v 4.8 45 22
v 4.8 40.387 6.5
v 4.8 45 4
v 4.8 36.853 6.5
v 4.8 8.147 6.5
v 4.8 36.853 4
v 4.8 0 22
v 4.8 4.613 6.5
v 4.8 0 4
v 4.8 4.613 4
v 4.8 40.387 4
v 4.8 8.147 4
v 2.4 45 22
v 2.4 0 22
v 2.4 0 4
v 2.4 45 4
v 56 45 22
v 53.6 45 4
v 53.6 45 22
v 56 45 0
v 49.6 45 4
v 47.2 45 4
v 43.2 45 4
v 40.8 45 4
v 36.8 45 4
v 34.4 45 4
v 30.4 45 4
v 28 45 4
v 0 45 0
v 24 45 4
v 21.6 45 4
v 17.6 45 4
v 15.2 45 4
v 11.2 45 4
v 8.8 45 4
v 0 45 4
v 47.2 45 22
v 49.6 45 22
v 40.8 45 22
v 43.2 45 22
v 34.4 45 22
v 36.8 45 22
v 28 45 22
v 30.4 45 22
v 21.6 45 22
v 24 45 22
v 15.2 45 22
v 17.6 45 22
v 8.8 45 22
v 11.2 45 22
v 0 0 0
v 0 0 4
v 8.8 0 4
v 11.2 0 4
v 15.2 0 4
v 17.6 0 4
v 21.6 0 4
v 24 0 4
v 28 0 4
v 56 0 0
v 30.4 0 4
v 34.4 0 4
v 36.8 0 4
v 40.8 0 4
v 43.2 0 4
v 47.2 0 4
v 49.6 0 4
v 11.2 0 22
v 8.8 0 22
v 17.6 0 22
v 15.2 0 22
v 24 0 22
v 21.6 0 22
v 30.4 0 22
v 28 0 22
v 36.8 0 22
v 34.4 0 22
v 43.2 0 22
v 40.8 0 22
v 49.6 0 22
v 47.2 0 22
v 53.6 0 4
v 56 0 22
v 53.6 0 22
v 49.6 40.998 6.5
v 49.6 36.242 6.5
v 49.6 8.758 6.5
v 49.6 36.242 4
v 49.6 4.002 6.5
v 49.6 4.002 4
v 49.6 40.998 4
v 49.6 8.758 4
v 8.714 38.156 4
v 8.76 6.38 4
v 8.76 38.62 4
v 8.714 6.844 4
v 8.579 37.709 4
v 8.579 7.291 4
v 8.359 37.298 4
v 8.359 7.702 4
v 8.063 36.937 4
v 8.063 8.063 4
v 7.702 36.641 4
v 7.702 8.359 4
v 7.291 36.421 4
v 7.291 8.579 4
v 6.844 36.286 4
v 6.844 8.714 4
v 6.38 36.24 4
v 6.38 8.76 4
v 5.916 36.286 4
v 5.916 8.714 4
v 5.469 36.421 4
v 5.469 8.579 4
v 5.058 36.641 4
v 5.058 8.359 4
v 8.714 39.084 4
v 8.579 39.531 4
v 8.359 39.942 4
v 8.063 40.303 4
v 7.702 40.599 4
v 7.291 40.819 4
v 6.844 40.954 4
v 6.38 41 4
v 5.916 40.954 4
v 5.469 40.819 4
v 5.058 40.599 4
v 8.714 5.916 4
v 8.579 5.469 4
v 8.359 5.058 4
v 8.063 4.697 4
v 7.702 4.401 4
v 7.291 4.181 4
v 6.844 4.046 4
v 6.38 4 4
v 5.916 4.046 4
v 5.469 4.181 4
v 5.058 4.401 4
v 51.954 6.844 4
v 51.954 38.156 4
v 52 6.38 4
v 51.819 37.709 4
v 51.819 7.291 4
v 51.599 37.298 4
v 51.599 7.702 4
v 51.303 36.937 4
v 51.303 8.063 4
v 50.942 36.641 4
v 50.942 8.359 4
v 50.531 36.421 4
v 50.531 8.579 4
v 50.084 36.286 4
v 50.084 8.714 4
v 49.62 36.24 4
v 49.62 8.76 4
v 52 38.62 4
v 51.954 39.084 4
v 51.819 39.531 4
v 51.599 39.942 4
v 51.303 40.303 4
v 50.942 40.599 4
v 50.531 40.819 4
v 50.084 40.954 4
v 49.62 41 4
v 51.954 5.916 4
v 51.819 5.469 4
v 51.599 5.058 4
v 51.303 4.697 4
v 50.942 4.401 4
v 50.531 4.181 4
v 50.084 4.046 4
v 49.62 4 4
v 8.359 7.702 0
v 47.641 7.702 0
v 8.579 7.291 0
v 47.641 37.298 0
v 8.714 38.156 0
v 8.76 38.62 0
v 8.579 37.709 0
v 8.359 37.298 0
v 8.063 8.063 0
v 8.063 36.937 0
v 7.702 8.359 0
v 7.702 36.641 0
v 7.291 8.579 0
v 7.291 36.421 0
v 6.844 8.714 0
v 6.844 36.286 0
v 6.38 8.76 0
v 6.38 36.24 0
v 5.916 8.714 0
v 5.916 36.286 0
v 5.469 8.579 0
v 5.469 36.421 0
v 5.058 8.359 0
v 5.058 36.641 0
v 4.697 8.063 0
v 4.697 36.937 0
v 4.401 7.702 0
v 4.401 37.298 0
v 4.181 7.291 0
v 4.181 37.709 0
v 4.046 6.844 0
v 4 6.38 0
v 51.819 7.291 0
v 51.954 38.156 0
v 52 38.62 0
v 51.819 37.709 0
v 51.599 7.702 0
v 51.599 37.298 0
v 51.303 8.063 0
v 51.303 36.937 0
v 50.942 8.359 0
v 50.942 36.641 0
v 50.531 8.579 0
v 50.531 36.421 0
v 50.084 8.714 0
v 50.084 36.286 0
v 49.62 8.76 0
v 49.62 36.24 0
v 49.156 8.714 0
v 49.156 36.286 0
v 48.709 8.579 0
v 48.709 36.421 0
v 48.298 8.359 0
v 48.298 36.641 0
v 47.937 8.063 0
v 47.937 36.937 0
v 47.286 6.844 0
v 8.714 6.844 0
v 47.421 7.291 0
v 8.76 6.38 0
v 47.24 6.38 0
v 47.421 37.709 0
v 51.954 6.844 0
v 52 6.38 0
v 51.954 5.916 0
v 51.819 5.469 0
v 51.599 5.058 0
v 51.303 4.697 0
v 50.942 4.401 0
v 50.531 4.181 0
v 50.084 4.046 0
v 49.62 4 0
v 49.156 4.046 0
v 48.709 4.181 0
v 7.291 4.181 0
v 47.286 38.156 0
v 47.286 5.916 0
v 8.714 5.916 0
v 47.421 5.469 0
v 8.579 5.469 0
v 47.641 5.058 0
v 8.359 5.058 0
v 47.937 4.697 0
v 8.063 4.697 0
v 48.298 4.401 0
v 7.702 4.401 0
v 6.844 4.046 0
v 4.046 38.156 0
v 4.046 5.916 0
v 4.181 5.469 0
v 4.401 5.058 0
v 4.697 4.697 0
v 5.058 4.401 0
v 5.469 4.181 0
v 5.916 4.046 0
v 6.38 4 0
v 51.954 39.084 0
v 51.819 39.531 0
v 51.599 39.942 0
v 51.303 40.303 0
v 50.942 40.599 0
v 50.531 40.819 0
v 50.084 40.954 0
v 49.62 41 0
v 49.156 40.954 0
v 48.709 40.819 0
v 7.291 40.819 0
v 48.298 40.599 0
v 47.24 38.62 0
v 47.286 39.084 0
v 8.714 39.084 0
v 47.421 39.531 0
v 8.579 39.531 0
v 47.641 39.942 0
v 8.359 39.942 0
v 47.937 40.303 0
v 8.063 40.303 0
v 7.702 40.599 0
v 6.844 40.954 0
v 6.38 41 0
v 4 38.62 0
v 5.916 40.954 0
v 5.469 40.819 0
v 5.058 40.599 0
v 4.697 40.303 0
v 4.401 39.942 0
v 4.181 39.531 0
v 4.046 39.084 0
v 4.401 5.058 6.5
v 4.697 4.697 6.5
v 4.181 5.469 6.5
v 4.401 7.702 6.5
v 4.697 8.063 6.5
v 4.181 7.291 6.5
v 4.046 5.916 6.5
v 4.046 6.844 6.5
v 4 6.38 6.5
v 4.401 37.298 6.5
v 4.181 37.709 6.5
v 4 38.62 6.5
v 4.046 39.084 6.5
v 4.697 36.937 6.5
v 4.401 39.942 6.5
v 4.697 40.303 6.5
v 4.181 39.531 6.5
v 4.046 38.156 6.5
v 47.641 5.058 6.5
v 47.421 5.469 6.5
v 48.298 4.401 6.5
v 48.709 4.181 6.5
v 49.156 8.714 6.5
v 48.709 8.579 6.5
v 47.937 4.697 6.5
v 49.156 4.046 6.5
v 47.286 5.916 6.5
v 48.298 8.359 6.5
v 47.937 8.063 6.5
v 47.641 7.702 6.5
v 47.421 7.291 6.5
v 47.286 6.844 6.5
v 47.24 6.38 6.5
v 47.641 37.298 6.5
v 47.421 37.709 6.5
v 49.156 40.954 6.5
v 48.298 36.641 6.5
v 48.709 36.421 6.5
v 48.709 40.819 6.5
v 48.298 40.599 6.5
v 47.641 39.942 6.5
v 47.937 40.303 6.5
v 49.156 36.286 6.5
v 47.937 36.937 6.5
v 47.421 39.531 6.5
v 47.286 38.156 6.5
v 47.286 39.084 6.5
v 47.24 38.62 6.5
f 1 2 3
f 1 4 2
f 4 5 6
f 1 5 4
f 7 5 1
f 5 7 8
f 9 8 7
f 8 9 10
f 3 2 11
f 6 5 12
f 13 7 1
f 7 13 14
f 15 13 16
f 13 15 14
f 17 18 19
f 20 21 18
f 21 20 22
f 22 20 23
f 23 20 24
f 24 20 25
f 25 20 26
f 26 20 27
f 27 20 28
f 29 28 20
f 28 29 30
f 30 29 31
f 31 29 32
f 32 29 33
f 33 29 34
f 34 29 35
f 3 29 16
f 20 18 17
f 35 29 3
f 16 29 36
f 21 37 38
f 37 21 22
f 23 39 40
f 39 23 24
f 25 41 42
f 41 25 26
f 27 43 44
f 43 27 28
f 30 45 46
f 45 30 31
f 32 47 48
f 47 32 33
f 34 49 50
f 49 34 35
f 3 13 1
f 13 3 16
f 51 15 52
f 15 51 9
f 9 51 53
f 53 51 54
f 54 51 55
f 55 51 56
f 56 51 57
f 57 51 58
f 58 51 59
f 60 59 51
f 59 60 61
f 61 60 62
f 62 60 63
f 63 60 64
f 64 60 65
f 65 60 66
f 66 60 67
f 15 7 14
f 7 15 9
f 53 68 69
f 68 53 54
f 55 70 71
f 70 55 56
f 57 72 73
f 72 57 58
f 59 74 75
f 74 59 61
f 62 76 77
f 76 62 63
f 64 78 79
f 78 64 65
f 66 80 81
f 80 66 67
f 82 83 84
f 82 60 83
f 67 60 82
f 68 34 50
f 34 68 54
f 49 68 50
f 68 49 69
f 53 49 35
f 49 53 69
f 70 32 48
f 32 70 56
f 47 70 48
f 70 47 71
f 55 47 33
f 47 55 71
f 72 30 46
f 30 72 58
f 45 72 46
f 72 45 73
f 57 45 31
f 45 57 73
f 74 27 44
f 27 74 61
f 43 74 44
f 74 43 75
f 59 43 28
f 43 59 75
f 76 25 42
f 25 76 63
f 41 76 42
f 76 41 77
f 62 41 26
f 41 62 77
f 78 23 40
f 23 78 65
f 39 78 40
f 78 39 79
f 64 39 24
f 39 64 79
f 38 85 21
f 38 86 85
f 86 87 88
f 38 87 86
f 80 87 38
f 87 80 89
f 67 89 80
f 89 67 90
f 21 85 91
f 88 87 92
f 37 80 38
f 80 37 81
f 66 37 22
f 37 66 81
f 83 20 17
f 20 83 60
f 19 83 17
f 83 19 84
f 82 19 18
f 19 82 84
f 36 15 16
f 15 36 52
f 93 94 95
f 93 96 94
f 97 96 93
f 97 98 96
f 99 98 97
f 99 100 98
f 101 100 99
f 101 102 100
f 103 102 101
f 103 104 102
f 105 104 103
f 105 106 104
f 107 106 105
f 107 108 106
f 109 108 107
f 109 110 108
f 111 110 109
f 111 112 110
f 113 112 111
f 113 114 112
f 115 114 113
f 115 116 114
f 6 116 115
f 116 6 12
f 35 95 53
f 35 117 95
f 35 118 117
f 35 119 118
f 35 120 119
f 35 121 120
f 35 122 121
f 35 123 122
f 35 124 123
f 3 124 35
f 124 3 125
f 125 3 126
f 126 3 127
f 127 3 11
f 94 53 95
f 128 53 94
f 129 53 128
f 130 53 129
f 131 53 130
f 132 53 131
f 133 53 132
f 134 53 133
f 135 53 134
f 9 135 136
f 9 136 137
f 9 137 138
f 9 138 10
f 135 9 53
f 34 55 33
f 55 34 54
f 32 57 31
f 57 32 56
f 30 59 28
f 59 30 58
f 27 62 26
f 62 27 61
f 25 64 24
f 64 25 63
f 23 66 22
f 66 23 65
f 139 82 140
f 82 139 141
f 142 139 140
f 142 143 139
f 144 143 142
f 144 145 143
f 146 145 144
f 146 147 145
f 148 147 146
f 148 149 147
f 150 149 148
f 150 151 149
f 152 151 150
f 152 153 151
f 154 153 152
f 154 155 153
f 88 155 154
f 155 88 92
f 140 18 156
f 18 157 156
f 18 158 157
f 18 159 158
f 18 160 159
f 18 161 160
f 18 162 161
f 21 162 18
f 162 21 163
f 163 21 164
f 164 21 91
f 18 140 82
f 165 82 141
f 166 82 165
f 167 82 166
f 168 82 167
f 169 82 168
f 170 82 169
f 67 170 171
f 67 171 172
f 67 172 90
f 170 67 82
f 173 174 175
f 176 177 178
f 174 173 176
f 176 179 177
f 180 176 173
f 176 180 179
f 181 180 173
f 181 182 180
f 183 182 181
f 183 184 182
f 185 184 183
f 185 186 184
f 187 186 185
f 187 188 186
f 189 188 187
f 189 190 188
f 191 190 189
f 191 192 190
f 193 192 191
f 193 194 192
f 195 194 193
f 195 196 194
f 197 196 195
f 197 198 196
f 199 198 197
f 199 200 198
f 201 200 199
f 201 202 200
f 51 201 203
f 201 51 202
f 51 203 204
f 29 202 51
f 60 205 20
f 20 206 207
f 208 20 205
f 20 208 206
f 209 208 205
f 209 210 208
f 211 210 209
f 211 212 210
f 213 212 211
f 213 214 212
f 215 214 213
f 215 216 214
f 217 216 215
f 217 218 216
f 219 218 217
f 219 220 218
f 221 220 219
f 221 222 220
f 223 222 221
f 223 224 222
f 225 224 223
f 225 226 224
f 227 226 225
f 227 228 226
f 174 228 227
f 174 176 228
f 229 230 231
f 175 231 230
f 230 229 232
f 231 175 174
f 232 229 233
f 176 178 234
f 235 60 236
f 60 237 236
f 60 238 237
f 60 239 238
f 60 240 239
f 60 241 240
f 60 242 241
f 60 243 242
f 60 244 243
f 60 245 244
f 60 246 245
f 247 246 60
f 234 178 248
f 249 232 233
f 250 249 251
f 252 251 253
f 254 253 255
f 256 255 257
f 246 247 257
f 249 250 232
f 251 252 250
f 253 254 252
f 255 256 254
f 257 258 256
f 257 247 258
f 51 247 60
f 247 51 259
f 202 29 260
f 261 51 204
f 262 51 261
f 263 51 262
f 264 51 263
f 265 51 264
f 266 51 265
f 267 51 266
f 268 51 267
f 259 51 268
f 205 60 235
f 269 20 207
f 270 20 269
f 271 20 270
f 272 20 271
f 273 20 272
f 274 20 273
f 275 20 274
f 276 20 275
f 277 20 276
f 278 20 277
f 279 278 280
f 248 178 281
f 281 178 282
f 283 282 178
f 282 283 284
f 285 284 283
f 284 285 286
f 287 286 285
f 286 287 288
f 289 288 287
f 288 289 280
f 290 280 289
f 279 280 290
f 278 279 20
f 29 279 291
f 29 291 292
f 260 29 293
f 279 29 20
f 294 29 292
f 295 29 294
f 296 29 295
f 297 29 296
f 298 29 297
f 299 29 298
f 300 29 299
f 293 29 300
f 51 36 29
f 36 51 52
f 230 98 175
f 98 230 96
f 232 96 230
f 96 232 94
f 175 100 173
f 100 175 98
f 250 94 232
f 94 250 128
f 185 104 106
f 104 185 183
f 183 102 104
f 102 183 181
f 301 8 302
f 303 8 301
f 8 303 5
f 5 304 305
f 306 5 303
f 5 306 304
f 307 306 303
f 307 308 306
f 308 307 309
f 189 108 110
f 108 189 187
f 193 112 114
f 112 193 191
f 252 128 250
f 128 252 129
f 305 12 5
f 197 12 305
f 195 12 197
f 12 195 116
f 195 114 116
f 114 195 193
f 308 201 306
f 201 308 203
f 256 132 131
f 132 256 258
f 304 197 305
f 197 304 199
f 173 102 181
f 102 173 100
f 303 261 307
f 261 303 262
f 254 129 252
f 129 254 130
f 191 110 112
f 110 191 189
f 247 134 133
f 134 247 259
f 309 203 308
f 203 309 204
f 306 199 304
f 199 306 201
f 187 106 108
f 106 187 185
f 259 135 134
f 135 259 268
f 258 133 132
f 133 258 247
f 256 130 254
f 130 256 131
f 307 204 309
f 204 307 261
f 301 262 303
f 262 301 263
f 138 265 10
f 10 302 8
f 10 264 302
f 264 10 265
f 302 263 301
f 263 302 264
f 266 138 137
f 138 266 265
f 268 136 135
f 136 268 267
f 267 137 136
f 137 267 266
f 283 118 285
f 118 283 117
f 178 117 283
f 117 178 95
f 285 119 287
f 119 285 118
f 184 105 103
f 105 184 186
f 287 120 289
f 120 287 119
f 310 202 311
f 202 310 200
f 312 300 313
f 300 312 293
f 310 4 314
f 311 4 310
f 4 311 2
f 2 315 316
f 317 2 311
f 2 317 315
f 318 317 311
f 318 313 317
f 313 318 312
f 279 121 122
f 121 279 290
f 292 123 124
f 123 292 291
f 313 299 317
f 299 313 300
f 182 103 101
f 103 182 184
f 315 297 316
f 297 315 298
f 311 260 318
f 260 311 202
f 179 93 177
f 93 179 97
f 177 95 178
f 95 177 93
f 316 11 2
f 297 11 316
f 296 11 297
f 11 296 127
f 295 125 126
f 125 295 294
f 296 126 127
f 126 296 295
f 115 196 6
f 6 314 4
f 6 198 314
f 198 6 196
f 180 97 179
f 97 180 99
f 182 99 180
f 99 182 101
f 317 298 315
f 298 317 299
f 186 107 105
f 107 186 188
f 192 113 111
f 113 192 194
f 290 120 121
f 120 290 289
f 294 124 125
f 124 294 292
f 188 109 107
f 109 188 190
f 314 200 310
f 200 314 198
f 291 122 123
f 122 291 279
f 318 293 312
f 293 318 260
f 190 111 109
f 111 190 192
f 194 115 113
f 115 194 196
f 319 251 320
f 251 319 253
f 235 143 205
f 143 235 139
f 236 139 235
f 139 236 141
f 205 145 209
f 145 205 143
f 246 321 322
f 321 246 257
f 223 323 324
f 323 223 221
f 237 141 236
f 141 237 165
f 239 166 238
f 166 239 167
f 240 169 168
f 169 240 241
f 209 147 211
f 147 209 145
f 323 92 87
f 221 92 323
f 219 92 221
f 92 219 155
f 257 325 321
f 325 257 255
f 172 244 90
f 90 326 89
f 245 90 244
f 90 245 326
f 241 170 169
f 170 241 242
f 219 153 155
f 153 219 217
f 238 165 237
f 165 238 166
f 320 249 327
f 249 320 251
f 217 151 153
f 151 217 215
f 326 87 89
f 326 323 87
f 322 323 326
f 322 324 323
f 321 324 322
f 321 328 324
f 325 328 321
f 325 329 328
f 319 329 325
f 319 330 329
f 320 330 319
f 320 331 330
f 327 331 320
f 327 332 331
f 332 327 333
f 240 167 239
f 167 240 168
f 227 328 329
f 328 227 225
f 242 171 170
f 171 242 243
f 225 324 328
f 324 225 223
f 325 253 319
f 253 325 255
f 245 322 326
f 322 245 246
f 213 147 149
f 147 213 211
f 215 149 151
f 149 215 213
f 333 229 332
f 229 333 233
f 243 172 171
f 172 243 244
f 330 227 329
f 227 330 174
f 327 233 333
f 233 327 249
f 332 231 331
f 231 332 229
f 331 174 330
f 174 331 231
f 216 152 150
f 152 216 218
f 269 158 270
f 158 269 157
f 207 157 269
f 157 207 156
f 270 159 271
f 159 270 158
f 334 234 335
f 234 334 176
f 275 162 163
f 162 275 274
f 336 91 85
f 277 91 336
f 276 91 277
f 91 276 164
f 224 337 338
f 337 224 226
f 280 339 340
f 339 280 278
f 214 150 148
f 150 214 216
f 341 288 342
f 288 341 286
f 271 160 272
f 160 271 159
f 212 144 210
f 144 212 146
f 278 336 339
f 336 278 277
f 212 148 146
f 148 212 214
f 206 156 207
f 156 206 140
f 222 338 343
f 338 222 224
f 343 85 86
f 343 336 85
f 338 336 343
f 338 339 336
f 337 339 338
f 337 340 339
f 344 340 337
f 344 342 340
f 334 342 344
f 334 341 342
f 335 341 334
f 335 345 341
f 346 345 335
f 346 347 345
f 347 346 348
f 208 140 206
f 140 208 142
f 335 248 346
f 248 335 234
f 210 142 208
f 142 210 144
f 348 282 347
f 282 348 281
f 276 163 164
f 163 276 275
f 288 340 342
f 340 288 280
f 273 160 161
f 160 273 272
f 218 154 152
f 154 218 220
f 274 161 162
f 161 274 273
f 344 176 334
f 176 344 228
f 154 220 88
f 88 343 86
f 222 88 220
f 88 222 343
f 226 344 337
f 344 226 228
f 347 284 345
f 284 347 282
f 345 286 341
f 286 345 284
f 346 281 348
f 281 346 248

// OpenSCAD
$fn = 32;

// ----------------------------------------------------------------------
// Finned heat sink: 56 x 45 mm base, 18 mm fins
// ----------------------------------------------------------------------

// --- parameters (mm) ---
base_w = 56;              // base width
base_d = 45;              // base depth
base_t = 4;               // base thickness
fin_h = 18;               // fin height above the base
holes_d = 4.76;           // fixing holes
hole_x = 21.62;           // hole offset in x
hole_y = 16.12;           // hole offset in y
fin_t = 2.4;              // fin thickness
fin_pitch = 6.4;          // fin pitch
fin_count = 9;            // number of fins
fin_x0 = 2.4;             // first fin offset

difference() {
  union() {
    cube([base_w, base_d, base_t]);
    for (i = [0 : fin_count - 1]) {
      translate([fin_x0 + i * fin_pitch, 0, base_t - 0.5]) cube([fin_t, base_d, fin_h + 0.5]);
    }
  }
  /* fixing holes through the base, 2.5 mm clear on both sides */
  for (hx = [-21.62, 21.62]) {
    for (hy = [-16.12, 16.12]) {
      translate([base_w / 2 + hx, base_d / 2 + hy, -2.5]) cylinder(h = base_t + 5, d = holes_d);
    }
  }
}
